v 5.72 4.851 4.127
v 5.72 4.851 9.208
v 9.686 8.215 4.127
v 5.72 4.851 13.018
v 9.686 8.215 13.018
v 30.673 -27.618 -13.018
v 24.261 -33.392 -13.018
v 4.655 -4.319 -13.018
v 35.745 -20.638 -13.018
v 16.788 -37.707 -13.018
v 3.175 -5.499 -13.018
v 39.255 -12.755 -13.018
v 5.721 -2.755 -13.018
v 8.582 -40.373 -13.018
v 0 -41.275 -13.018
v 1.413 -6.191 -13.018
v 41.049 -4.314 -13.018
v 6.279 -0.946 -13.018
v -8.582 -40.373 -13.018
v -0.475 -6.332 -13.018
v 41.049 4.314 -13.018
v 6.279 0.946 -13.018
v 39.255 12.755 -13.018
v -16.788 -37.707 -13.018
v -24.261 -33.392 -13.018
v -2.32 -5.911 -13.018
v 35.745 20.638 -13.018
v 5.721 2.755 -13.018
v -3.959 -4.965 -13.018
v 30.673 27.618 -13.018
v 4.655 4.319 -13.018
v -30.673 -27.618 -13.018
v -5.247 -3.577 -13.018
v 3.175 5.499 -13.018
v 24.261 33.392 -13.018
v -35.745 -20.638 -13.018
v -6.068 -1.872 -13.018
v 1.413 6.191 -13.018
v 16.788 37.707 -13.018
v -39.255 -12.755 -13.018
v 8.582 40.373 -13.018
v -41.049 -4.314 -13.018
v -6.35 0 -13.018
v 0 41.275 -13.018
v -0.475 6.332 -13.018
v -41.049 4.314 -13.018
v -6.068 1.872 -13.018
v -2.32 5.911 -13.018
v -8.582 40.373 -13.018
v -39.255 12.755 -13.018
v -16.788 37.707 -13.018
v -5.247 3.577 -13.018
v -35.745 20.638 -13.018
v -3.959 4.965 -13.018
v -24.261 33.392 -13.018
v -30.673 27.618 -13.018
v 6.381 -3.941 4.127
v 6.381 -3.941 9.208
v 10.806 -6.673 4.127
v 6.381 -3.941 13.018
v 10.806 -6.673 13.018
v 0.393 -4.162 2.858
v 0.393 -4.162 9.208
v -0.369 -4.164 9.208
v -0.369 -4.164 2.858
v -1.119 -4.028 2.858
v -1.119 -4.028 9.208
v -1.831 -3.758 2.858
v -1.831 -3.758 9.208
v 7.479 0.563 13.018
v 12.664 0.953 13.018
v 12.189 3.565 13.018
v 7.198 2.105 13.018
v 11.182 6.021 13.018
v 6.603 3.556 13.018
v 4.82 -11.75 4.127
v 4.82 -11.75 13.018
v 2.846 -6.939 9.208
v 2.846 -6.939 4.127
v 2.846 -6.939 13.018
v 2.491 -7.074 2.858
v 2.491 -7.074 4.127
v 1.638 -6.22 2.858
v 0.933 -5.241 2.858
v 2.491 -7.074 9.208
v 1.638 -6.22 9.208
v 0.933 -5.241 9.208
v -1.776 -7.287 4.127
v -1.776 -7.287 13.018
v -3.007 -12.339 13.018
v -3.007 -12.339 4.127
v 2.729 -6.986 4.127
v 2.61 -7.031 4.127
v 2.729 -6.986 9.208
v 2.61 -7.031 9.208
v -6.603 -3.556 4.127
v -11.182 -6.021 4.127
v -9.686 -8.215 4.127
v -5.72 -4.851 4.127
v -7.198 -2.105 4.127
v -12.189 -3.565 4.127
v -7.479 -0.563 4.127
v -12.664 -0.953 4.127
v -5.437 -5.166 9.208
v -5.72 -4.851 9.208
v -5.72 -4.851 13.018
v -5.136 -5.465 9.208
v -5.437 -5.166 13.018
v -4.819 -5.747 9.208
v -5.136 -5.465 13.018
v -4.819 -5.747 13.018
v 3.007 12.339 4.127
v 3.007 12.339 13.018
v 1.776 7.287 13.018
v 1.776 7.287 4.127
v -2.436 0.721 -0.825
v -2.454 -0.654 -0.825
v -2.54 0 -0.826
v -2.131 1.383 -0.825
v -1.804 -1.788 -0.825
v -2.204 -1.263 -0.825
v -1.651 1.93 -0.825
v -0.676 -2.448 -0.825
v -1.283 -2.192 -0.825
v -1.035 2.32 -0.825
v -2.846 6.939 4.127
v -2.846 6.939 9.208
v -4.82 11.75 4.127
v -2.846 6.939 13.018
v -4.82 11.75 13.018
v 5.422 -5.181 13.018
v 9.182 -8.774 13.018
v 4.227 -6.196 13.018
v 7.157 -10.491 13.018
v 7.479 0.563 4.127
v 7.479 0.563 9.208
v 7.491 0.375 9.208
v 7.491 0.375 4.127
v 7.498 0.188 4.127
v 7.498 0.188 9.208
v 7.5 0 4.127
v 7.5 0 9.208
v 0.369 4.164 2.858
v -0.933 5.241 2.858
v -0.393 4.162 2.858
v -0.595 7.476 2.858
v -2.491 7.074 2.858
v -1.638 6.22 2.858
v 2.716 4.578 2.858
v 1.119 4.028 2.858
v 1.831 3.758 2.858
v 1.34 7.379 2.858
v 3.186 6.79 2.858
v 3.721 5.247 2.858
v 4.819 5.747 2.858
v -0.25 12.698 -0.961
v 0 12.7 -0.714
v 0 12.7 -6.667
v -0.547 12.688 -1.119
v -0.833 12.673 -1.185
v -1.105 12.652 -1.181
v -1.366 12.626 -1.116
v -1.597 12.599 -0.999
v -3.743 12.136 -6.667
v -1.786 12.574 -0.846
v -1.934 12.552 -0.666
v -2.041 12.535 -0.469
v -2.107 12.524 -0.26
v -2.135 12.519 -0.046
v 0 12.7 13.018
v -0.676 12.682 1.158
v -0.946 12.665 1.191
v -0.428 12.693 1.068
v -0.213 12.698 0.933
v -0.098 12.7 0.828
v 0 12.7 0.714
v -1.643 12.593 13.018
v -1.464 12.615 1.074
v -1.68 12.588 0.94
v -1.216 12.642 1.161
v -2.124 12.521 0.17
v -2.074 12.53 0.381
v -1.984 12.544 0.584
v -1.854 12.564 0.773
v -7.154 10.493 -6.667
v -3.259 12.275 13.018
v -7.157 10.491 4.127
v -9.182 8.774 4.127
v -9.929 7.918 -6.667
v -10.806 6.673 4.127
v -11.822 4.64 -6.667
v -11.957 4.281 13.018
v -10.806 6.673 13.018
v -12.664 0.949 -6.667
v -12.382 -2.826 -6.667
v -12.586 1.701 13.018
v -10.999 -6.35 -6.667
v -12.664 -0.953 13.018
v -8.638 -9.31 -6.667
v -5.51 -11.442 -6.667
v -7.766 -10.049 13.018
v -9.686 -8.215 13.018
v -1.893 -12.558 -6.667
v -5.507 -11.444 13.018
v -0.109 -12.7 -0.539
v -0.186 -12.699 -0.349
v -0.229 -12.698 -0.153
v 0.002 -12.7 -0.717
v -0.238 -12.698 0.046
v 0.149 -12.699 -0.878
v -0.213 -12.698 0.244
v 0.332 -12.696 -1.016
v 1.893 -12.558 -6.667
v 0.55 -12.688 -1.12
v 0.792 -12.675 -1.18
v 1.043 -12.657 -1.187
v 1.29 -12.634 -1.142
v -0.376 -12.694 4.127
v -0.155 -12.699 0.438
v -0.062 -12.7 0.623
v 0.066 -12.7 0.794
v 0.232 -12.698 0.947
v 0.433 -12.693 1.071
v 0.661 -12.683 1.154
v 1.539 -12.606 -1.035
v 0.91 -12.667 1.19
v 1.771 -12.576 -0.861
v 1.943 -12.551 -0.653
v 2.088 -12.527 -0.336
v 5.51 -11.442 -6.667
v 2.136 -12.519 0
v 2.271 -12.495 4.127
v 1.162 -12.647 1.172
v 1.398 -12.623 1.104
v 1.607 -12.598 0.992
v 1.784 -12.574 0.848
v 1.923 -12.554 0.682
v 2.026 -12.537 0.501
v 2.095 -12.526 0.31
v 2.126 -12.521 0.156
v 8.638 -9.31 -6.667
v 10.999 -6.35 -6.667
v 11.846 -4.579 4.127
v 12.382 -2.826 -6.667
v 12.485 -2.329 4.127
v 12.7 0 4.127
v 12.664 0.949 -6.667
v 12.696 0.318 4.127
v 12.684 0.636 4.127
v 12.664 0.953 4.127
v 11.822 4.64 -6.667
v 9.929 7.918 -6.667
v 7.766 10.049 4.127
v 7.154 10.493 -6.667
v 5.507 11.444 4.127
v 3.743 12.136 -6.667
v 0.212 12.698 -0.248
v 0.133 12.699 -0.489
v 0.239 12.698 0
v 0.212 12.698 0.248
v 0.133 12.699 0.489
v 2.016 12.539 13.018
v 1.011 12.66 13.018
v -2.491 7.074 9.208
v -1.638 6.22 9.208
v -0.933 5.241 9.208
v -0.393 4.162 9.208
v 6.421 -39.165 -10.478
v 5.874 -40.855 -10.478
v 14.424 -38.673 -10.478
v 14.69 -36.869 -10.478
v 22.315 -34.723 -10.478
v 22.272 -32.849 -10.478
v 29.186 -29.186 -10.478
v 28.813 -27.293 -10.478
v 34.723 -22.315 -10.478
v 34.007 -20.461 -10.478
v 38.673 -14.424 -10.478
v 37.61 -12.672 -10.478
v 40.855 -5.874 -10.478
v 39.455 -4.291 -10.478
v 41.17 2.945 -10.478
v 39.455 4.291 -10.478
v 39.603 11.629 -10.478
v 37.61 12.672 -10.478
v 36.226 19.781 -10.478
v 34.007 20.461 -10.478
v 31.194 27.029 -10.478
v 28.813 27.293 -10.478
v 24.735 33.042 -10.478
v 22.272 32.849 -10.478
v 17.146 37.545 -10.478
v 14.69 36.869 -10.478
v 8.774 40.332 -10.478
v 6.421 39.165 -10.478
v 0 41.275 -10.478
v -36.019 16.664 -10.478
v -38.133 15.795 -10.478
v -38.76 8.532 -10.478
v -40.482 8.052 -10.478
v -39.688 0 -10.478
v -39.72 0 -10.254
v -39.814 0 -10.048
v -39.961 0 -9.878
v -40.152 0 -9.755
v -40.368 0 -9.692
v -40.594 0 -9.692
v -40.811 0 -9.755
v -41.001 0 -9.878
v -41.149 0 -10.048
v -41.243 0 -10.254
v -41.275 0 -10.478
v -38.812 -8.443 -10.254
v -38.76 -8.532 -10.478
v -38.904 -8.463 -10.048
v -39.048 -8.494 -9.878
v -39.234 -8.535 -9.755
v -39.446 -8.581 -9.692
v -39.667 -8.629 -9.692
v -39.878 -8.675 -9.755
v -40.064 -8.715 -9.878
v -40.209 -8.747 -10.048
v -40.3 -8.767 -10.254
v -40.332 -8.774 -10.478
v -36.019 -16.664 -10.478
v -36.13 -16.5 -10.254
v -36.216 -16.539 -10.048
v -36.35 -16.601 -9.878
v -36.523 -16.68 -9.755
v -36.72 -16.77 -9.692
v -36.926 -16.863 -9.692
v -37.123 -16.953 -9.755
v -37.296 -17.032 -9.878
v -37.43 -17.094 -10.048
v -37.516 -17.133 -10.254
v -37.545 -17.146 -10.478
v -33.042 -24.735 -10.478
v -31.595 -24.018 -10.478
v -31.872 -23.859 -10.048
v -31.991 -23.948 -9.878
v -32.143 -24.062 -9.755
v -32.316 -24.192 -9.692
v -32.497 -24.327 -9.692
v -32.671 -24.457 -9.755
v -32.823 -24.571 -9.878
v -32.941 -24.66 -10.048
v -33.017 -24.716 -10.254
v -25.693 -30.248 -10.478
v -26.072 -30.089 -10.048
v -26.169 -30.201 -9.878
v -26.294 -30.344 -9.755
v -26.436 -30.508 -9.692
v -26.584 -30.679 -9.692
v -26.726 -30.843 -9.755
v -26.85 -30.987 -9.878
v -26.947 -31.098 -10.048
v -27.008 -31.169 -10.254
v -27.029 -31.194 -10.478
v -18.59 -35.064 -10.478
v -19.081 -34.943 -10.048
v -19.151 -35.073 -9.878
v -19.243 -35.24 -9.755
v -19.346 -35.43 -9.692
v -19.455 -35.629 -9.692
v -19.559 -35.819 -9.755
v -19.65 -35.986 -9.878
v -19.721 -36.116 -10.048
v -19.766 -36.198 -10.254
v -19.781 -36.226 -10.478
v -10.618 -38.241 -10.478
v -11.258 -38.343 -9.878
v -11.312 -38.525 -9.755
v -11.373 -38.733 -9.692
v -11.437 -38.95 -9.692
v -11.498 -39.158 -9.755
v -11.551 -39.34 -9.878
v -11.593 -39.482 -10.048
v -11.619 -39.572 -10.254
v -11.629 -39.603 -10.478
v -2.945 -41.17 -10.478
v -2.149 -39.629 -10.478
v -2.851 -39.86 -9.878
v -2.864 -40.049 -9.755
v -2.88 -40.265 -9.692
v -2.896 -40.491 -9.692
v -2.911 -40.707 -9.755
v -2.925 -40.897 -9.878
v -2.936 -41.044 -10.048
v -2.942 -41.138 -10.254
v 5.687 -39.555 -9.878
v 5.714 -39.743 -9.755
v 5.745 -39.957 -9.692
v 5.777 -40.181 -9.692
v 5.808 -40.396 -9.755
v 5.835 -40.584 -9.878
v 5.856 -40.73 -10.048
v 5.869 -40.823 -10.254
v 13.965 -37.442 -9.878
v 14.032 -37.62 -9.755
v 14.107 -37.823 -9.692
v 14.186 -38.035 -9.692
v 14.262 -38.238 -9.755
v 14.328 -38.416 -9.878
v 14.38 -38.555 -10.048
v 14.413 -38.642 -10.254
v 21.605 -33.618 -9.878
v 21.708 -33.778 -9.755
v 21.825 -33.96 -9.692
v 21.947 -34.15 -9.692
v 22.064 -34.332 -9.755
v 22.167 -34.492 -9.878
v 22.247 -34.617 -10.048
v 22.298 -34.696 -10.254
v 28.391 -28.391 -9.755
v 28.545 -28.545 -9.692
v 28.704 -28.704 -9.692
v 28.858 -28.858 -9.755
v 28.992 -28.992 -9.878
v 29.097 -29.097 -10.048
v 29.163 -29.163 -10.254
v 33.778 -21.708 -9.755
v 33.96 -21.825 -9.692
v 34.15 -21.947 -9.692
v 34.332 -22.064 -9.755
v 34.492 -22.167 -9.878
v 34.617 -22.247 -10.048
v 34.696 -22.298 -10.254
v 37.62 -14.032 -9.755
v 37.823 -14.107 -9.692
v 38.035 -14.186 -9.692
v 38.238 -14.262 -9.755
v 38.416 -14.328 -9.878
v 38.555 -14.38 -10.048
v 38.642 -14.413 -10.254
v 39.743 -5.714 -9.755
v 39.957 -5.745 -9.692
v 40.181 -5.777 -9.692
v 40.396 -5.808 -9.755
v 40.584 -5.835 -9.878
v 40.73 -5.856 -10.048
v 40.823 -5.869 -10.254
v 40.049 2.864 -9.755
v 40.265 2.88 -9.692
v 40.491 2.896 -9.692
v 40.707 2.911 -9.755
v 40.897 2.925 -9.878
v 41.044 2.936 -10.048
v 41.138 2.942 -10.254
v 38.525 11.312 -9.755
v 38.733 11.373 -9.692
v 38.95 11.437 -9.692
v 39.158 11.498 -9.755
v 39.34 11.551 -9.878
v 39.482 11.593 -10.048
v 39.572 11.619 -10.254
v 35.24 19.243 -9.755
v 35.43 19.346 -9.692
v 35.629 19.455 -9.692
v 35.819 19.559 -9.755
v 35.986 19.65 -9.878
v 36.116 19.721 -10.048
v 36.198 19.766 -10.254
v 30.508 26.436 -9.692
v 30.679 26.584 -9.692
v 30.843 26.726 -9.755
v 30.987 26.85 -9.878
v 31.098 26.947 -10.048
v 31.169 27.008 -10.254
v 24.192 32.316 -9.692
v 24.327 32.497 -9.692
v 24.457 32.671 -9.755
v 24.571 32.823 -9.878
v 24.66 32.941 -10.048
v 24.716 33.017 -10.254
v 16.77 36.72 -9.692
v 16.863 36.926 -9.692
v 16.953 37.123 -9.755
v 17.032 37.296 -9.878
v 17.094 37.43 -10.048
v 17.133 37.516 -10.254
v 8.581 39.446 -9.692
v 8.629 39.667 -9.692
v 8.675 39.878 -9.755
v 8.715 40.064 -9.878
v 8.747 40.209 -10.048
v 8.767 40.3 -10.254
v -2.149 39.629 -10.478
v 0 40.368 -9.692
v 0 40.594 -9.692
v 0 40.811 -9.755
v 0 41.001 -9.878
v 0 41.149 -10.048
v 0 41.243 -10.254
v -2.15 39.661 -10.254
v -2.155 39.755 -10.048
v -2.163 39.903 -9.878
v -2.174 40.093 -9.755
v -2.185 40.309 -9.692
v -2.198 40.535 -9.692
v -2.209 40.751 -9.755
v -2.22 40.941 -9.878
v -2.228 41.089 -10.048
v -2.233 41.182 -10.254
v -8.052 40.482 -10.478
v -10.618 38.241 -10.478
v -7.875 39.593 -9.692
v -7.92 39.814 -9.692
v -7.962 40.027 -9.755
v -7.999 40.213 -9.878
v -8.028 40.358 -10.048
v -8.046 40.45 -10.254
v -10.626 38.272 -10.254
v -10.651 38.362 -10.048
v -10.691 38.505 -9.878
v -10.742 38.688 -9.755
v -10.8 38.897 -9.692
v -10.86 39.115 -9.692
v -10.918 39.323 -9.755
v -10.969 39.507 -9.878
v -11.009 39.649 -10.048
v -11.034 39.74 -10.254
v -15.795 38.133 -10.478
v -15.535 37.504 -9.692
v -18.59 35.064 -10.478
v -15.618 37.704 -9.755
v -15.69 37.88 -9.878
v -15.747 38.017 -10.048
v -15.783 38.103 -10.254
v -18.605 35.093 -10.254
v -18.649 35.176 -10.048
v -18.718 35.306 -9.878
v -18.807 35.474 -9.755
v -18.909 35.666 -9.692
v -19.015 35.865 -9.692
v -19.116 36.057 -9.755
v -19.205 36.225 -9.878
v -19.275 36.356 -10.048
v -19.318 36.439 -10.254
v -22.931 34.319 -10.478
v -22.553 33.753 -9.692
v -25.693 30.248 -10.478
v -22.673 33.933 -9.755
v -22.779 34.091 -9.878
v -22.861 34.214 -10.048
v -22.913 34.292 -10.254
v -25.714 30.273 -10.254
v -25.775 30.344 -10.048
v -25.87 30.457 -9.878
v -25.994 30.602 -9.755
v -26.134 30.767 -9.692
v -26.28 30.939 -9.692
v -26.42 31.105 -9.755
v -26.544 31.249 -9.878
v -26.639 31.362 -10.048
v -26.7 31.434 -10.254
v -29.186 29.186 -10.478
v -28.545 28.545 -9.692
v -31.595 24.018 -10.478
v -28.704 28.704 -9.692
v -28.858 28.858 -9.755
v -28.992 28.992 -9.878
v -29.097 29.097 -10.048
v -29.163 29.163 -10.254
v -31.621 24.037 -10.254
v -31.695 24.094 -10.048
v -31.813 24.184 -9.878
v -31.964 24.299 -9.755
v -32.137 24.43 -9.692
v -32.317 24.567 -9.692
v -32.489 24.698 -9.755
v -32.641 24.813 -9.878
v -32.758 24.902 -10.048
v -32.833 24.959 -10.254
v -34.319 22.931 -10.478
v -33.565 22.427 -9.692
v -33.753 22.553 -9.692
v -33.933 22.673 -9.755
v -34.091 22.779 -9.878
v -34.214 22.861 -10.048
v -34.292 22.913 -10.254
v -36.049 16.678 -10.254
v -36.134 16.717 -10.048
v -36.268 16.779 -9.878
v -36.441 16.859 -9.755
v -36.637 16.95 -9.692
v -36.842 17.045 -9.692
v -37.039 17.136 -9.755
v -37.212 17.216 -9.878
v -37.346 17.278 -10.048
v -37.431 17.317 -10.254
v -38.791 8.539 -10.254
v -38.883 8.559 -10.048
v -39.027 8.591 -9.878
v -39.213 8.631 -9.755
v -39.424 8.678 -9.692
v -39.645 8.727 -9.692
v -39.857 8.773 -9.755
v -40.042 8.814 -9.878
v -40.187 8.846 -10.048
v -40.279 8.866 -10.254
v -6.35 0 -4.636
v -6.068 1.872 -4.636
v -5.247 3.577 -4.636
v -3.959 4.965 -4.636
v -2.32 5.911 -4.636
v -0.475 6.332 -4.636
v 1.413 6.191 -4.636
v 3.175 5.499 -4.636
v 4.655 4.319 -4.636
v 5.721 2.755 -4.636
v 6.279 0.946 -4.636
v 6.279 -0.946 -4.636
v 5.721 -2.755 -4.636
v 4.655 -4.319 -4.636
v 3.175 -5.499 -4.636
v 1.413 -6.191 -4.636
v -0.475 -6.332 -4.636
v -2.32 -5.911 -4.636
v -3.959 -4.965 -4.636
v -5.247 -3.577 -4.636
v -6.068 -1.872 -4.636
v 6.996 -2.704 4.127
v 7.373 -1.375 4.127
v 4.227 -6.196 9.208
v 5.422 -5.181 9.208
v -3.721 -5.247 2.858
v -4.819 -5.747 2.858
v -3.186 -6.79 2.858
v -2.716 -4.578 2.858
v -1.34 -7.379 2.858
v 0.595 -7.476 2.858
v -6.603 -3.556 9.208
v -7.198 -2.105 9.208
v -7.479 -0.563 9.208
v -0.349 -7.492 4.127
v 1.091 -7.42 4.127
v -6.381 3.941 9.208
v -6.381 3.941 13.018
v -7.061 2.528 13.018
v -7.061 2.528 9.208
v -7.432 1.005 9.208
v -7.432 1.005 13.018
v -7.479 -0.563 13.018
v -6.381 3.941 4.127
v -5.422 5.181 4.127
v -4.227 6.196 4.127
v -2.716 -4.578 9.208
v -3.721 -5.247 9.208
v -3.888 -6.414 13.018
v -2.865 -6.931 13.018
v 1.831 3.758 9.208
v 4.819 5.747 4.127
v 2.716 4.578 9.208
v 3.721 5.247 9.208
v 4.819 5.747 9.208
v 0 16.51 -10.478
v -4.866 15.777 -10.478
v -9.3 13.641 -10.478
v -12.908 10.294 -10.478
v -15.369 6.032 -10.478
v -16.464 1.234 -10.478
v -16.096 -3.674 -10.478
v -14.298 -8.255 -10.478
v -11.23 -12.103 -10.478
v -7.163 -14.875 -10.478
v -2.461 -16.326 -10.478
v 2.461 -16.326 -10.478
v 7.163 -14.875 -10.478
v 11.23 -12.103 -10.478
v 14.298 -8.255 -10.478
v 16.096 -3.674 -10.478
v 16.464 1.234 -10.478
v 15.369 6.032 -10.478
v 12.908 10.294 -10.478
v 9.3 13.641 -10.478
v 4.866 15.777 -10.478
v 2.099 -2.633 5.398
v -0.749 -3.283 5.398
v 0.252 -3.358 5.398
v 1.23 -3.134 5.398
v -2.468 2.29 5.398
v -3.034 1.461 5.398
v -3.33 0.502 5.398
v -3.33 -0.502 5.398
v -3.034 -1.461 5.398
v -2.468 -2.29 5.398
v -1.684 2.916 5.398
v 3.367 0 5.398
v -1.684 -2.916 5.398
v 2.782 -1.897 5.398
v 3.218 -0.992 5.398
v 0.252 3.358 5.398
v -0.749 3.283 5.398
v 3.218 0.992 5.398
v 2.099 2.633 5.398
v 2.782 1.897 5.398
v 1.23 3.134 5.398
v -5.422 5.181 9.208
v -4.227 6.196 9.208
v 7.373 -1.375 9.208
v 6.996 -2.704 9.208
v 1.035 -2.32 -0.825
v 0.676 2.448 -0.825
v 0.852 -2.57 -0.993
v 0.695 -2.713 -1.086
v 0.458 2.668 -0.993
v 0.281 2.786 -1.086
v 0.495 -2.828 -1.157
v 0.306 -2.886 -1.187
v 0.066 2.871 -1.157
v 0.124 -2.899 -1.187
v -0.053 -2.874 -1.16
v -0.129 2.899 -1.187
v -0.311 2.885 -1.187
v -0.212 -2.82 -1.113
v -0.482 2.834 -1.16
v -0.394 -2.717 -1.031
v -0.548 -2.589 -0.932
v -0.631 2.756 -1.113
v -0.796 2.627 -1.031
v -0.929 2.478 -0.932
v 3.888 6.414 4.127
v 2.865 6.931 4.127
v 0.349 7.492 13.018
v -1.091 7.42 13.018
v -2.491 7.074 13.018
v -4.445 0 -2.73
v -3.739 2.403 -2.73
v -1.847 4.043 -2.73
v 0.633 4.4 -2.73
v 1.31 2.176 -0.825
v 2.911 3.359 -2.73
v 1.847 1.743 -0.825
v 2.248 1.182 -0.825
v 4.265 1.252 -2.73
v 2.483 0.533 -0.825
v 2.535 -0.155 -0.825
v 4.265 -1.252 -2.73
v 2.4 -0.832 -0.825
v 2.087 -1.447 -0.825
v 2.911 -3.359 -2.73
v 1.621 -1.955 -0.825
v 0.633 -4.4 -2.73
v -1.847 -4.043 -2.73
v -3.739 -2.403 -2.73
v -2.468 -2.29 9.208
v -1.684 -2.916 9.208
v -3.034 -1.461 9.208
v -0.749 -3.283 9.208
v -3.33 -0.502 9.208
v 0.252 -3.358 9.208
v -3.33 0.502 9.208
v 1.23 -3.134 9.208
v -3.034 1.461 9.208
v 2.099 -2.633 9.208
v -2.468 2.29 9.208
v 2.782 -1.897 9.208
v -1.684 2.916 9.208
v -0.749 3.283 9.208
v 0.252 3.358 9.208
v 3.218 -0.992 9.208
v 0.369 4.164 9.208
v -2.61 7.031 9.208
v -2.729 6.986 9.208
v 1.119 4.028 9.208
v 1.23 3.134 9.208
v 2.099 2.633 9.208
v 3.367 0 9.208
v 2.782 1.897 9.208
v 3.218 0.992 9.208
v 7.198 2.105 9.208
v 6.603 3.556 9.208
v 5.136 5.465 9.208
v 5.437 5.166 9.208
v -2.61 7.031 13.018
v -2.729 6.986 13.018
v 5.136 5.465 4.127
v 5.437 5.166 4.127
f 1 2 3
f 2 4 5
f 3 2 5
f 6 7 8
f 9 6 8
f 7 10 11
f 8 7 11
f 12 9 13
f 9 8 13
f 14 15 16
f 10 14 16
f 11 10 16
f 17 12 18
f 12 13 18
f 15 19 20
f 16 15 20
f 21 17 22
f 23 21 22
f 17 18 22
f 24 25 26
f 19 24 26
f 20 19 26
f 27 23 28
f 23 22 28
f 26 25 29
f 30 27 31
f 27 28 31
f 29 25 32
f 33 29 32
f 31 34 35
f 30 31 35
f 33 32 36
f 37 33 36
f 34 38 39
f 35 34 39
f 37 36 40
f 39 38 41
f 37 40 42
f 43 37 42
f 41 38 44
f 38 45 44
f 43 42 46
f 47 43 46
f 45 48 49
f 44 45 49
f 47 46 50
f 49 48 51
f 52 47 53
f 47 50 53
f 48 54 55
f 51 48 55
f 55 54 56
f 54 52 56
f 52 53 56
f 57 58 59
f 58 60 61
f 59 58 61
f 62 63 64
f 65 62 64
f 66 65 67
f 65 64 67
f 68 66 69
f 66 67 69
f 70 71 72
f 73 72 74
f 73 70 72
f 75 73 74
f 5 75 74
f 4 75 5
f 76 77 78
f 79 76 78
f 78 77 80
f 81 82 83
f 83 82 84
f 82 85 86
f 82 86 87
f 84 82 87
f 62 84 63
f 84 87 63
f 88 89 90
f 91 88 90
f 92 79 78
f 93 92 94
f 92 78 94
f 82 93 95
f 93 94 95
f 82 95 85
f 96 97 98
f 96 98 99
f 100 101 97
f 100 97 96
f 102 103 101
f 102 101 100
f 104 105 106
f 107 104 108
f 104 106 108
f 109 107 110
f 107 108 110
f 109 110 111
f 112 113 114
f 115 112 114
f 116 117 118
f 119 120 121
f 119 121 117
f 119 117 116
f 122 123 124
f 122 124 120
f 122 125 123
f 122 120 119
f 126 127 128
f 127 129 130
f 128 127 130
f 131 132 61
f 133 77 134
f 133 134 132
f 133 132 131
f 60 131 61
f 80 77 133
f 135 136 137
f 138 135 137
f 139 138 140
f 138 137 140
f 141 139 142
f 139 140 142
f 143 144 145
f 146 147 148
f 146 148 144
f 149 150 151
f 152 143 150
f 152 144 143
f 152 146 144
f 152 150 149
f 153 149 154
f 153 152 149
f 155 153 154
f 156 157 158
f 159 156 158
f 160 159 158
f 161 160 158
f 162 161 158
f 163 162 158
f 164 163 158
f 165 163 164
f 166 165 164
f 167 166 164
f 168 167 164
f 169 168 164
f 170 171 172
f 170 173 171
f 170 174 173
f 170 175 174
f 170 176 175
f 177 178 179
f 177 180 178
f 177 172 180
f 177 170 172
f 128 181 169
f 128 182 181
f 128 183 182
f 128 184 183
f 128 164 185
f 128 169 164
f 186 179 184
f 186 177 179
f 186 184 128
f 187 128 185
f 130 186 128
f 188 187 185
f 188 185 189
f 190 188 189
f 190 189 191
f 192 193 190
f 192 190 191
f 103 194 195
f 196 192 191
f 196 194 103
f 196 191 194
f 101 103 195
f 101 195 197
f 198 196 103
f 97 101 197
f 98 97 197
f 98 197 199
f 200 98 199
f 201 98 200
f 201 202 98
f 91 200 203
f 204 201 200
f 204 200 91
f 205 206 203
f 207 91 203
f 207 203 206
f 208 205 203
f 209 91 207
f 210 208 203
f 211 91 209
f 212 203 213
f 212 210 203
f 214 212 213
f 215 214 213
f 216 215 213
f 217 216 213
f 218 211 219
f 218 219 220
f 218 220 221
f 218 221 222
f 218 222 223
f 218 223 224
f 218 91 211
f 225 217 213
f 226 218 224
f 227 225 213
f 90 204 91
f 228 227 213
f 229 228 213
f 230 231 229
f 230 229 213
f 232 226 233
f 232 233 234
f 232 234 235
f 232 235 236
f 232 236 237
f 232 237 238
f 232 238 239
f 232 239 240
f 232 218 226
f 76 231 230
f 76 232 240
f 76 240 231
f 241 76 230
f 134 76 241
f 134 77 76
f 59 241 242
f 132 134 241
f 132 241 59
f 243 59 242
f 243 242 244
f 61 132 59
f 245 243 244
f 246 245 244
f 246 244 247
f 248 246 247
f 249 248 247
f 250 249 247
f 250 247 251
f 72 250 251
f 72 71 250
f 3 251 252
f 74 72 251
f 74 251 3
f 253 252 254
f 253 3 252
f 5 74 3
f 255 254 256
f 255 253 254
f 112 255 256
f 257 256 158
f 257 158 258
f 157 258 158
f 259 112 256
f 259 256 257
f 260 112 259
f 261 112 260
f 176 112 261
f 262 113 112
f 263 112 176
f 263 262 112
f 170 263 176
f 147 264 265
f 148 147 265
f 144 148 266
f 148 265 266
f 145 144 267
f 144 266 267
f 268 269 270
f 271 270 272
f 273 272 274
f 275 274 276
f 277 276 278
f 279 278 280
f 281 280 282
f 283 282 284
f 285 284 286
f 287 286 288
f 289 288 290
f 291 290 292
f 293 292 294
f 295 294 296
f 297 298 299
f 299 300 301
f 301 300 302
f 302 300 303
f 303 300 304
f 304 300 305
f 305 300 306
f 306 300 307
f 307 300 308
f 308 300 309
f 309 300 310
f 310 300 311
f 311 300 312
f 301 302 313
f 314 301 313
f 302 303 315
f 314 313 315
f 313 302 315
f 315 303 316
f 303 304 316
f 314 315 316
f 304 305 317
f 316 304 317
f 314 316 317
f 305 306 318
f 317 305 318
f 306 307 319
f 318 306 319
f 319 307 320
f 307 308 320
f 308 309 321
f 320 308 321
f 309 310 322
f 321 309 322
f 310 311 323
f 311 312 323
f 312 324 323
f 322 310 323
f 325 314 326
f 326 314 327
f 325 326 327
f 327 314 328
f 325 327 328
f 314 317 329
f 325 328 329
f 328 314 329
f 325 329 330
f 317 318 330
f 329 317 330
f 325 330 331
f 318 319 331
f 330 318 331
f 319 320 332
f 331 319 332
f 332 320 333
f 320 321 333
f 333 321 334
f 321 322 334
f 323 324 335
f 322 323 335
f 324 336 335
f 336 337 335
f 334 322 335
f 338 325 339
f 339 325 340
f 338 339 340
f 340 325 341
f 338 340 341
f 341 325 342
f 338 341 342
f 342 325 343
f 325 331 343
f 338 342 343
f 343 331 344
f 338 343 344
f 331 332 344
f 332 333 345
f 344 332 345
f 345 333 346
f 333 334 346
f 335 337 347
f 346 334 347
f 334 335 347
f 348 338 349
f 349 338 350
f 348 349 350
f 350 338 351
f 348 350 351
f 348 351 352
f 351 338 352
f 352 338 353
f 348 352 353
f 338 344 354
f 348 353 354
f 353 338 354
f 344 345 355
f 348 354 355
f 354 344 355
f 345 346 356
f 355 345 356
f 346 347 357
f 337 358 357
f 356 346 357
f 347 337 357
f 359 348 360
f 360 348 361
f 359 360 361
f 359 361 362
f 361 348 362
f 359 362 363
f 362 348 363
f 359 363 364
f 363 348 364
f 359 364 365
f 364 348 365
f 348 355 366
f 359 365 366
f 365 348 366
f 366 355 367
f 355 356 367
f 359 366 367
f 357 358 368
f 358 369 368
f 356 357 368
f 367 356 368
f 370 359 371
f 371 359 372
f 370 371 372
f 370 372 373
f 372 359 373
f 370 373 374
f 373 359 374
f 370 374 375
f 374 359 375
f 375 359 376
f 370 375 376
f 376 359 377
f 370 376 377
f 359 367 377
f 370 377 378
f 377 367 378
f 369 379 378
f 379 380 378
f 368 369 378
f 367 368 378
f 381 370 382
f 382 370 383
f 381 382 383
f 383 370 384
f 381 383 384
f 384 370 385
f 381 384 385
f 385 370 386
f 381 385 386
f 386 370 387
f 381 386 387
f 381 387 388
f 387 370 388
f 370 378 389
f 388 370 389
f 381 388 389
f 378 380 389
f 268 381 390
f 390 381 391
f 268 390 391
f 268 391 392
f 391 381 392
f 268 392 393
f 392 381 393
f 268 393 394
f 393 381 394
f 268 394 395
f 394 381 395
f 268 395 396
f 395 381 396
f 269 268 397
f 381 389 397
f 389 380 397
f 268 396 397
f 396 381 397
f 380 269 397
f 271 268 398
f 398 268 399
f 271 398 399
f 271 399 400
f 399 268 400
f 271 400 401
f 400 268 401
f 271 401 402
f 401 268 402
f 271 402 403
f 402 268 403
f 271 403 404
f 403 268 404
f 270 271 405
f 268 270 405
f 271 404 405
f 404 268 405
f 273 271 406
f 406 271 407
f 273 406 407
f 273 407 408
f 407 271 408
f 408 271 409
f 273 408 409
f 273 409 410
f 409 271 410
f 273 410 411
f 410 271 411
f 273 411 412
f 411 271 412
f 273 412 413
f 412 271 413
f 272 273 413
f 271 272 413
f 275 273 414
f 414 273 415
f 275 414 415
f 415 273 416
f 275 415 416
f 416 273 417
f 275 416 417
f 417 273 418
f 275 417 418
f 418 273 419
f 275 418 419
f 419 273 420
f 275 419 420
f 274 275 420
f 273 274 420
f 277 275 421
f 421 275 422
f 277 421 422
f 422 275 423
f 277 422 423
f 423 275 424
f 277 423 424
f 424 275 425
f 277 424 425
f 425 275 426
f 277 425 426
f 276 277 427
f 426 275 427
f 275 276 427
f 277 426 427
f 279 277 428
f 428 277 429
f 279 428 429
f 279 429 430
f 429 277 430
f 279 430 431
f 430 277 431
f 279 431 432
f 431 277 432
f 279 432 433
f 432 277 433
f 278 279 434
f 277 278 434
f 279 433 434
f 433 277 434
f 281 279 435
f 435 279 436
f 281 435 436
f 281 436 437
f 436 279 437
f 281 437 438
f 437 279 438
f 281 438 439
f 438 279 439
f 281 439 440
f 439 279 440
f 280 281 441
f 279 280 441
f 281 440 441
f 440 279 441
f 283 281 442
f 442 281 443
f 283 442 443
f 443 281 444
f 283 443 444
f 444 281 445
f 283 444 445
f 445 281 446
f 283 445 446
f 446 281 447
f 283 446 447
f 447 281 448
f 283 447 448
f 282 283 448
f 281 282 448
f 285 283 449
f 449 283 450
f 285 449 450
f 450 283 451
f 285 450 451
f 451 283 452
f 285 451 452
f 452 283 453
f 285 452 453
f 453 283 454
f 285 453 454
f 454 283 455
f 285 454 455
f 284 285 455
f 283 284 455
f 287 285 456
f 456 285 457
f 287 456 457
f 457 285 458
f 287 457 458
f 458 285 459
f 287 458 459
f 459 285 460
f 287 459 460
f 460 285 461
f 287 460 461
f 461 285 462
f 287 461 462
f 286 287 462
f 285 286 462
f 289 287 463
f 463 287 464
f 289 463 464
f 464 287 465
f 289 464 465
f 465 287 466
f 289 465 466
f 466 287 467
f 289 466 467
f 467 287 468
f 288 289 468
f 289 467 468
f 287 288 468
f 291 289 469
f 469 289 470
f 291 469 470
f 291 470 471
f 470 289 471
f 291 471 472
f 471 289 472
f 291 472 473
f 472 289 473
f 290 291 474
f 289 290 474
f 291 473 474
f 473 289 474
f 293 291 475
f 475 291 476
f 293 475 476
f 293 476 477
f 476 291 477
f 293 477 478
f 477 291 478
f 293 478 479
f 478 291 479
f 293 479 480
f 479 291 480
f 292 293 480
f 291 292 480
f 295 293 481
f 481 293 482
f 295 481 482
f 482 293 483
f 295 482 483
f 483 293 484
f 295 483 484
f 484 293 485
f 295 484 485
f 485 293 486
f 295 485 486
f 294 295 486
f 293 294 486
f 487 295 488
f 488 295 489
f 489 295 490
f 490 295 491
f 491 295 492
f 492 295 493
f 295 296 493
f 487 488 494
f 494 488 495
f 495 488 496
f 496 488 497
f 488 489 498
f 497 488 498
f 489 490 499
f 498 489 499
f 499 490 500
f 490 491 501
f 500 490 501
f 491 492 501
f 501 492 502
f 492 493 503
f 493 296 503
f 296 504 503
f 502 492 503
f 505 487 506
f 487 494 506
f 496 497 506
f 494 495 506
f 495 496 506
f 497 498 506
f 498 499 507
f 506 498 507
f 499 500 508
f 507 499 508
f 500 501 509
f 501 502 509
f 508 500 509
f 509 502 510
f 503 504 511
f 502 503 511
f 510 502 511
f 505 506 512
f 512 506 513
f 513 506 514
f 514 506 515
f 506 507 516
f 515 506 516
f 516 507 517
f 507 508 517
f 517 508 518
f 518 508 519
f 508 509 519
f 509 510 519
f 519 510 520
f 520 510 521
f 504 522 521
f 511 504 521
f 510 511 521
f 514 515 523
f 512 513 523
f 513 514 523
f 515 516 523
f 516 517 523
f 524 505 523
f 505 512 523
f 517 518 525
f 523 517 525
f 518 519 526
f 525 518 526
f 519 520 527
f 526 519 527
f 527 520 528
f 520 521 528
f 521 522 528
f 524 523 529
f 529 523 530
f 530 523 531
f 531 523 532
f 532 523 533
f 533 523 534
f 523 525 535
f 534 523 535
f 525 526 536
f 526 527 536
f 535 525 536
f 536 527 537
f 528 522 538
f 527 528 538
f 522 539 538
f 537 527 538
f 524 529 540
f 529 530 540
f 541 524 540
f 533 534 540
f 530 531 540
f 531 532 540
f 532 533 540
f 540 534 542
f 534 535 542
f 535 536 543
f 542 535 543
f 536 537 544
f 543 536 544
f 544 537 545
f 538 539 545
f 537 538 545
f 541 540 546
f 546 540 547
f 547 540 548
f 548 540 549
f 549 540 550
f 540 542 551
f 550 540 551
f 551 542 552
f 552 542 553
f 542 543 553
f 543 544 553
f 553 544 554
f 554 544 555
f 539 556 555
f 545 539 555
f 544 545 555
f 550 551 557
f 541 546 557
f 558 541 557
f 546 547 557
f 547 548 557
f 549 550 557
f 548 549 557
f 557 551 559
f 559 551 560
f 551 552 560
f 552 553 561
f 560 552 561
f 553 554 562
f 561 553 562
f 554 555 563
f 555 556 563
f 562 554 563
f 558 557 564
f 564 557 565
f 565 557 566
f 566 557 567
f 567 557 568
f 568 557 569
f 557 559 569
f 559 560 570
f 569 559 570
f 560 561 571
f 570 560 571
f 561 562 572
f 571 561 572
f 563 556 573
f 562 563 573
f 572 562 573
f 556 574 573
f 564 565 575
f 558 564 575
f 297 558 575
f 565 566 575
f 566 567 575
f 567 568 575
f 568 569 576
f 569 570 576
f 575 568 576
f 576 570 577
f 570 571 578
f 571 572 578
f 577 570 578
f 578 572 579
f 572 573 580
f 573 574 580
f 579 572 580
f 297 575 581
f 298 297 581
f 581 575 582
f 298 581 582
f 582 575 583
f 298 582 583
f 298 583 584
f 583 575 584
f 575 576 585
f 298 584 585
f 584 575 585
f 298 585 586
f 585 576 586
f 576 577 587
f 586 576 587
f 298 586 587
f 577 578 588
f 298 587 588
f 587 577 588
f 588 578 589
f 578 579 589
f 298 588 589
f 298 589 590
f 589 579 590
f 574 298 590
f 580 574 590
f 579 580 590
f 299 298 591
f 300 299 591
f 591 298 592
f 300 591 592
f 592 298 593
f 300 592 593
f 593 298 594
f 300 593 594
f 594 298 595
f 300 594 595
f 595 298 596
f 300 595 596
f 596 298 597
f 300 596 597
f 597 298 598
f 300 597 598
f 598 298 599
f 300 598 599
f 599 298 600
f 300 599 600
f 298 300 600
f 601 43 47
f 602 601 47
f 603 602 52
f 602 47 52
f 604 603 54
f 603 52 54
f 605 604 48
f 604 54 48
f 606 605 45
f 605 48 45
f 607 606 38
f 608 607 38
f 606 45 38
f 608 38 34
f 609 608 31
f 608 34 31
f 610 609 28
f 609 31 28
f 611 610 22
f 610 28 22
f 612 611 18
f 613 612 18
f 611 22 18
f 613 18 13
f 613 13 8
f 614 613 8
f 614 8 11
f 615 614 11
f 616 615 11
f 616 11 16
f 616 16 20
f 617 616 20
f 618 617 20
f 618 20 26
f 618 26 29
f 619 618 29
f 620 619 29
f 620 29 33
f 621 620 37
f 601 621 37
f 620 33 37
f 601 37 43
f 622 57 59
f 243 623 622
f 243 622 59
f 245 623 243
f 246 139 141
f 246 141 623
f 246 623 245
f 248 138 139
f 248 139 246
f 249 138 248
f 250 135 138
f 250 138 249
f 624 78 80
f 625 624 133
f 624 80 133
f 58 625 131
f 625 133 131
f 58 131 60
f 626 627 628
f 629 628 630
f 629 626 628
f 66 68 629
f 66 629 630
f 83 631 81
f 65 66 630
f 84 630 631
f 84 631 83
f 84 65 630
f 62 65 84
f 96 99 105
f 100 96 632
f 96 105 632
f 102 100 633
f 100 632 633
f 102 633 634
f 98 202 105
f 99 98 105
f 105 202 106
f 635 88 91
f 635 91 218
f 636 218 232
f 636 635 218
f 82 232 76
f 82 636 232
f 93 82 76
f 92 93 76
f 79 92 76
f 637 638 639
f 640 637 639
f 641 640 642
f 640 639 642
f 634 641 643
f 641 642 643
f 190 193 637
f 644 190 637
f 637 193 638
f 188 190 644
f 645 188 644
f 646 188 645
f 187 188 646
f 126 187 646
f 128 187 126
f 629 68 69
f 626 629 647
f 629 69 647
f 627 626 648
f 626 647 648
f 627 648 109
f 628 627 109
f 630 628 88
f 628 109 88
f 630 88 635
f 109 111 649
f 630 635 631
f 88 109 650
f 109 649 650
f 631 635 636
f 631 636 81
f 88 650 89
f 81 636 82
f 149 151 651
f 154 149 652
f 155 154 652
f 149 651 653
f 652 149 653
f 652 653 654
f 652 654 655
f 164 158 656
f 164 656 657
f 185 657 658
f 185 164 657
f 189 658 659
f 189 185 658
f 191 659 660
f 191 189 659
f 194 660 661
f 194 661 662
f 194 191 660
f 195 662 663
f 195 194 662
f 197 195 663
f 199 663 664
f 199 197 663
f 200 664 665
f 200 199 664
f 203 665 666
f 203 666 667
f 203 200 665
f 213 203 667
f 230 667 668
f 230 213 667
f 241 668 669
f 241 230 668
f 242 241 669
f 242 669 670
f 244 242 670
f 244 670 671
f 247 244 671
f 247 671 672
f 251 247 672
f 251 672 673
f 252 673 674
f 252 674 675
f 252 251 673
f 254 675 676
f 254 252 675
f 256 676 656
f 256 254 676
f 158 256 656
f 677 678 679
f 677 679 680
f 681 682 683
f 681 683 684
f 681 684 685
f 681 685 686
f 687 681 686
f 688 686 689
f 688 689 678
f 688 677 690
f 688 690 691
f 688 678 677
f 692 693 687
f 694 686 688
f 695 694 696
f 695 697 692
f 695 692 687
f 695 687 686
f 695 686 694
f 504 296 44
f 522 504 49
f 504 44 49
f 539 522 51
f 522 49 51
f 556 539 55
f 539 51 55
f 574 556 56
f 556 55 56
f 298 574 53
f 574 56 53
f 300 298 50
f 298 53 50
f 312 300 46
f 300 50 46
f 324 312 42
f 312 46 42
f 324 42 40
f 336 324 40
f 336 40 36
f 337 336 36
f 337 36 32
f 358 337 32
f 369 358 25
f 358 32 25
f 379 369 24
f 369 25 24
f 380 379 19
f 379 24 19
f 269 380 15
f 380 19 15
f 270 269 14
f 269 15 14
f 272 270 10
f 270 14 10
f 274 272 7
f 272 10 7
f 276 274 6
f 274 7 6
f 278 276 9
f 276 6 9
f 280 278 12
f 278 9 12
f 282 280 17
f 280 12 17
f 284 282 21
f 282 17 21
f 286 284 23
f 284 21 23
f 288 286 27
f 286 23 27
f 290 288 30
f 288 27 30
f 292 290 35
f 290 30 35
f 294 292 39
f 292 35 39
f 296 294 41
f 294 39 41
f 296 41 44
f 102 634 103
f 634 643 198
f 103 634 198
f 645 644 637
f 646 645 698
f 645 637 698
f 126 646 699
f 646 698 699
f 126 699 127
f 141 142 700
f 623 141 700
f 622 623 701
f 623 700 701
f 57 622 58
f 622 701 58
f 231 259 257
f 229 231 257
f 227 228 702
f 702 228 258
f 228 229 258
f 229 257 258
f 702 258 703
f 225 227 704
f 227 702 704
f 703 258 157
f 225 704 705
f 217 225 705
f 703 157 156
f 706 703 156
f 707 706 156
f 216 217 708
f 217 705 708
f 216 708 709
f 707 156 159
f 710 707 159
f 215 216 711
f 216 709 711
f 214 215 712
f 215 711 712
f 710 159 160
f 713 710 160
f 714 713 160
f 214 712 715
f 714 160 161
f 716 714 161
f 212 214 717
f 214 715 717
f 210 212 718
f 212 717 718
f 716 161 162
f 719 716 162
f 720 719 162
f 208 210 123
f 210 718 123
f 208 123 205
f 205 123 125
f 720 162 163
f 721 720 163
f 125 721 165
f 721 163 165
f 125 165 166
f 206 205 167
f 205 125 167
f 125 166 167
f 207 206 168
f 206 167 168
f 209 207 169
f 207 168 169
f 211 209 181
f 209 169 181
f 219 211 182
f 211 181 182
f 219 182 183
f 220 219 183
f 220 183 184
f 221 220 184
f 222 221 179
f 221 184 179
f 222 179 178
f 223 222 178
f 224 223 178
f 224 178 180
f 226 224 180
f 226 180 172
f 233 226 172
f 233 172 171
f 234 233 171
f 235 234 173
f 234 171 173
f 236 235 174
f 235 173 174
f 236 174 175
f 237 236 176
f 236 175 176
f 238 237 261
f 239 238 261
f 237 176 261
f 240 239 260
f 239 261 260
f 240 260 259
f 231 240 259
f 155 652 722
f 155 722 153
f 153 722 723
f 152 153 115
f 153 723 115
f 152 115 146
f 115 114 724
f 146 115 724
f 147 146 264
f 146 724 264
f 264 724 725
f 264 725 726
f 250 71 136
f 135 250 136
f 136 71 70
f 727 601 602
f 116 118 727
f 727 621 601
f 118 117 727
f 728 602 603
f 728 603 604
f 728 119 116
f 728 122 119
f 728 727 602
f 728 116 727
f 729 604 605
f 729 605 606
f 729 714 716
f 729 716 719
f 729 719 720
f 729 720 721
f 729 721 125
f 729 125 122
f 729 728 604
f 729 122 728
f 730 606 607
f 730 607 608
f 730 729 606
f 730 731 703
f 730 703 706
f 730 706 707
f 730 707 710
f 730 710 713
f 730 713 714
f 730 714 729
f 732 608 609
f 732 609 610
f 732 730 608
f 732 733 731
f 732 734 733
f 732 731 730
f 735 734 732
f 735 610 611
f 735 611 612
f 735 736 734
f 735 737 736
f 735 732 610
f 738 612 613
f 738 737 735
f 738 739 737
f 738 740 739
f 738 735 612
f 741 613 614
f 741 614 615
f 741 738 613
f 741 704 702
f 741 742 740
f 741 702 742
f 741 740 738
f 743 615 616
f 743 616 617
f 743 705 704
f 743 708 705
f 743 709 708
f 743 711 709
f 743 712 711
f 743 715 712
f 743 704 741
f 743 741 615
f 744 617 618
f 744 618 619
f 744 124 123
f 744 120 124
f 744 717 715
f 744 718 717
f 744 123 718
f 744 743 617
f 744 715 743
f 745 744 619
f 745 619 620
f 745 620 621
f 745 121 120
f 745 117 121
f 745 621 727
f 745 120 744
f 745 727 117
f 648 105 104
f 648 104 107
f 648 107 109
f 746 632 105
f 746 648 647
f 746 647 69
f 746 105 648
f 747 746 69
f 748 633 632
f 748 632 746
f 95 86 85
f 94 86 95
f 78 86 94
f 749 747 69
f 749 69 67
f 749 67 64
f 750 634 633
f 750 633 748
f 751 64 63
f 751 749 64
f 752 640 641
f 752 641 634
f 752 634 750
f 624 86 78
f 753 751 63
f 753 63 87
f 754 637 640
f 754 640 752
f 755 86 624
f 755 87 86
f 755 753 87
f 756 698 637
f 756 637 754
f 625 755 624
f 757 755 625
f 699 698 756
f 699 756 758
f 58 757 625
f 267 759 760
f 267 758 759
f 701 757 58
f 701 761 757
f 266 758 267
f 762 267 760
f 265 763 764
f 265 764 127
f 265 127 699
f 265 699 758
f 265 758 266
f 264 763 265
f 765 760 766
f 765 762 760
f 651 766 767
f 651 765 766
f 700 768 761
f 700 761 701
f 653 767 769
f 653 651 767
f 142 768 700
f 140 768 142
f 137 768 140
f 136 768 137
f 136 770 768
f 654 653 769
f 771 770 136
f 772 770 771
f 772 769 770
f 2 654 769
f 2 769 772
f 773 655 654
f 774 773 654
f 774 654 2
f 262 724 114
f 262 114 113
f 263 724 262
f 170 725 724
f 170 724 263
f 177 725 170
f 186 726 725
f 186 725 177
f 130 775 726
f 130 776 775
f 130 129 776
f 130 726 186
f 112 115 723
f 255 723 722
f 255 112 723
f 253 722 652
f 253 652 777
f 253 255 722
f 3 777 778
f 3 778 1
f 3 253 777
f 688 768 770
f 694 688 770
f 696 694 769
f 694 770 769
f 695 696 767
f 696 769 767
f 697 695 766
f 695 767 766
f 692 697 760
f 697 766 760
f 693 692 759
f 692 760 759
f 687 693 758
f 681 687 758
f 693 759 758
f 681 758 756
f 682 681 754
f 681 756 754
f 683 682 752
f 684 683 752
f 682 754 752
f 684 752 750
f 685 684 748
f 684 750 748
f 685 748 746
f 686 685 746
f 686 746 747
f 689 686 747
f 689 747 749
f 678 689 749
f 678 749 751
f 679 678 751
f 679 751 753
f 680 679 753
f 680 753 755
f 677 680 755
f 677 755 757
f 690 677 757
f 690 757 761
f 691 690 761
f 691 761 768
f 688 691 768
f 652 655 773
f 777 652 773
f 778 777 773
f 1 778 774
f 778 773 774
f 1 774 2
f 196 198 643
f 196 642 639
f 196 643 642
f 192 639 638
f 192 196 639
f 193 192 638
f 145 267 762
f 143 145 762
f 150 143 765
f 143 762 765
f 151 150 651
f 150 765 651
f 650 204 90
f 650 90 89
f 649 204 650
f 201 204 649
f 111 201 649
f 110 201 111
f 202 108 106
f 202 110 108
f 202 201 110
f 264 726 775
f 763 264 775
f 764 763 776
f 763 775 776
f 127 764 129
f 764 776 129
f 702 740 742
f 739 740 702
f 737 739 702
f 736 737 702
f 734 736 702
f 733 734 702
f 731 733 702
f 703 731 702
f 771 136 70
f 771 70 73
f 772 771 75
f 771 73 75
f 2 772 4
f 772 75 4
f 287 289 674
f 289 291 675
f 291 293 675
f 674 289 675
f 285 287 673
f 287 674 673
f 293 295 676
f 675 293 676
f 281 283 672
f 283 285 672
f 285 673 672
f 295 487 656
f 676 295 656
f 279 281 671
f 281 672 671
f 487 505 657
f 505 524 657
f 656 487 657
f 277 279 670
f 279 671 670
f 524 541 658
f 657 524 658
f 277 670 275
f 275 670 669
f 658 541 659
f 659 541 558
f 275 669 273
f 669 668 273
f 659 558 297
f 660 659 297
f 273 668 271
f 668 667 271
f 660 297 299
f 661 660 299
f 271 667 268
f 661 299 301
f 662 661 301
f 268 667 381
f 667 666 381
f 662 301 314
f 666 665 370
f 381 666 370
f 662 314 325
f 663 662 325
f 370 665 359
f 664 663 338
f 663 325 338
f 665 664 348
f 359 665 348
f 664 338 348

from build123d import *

# Parameters (mm, degrees)
SKETCH11_R                      = 3.3672
CUT_EXTRUDE5_DEPTH              = 3.81
SKETCH11_5_R                    = 3.3672
CUT_EXTRUDE7_DEPTH              = 7.62
CUT_EXTRUDE8_DEPTH              = 10.16
SKETCH13_R                      = 6.35
CUT_EXTRUDE10_DEPTH             = 12.192
CHAMFER1_SIZE                   = 3.81
CHAMFER2_SIZE                   = 3.81
CUT_EXTRUDE11_DEPTH             = 8.89
F_3_32_0_09375_DIAMETER_HOLE1_D = 2.38125


with BuildPart() as part:
    # Sketch2 → Revolve1 (revolve)
    with BuildSketch(Plane(origin=(0, 0, 0), x_dir=(0, 0, -1), z_dir=(1, 0, 0))):
        Polygon((-13.0175, 0), (-13.0175, 9.525), (-13.0175, 12.7), (-9.8425, 12.7), (10.4775, 12.7), (10.4775, 41.275), (13.0175, 41.275), (13.0175, 0), align=None)
    revolve(axis=Axis((0, 0, -13.0175), (0, 0, 1)))

    # Sketch11 → Cut-Extrude5 (cut)
    with BuildSketch(Plane.XY.offset(13.0175)):
        with BuildLine():
            ThreePointArc((-4.819494332, -5.746518457), (-1.340267005, -7.379273972), (2.490906416, -7.074276304))
            ThreePointArc((2.490906416, -7.074276304), (1.265901972, -5.744591723), (0.392647765, -4.16151748))
            ThreePointArc((0.392647765, -4.16151748), (-0.746975478, -4.11271536), (-1.830973459, -3.757650355))
            ThreePointArc((-1.830973459, -3.757650355), (-3.205144168, -4.932534109), (-4.819494332, -5.746518457))
        make_face()
        with BuildLine():
            ThreePointArc((7.5, 0), (6.796918695, 3.17047256), (4.819494332, 5.746518457))
            ThreePointArc((4.819494332, 5.746518457), (3.205144168, 4.932534109), (1.830973459, 3.757650355))
            ThreePointArc((1.830973459, 3.757650355), (0.746975478, 4.11271536), (-0.392647765, 4.16151748))
            ThreePointArc((-0.392647765, 4.16151748), (-1.265901972, 5.744591723), (-2.490906416, 7.074276304))
            ThreePointArc((-2.490906416, 7.074276304), (-7.379273972, 1.340267005), (-4.819494332, -5.746518457))
            ThreePointArc((-4.819494332, -5.746518457), (-3.205144168, -4.932534109), (-1.830973459, -3.757650355))
            ThreePointArc((-1.830973459, -3.757650355), (-0.746975478, -4.11271536), (0.392647765, -4.16151748))
            ThreePointArc((0.392647765, -4.16151748), (1.265901972, -5.744591723), (2.490906416, -7.074276304))
            ThreePointArc((2.490906416, -7.074276304), (6.120939394, -4.334062868), (7.5, 0))
        make_face()
        Circle(SKETCH11_R, mode=Mode.SUBTRACT)
        Circle(SKETCH11_R)
        with BuildLine():
            ThreePointArc((1.830973459, 3.757650355), (3.205144168, 4.932534109), (4.819494332, 5.746518457))
            ThreePointArc((4.819494332, 5.746518457), (1.340267005, 7.379273972), (-2.490906416, 7.074276304))
            ThreePointArc((-2.490906416, 7.074276304), (-1.265901972, 5.744591723), (-0.392647765, 4.16151748))
            ThreePointArc((-0.392647765, 4.16151748), (0.746975478, 4.11271536), (1.830973459, 3.757650355))
        make_face()
    extrude(amount=-CUT_EXTRUDE5_DEPTH, mode=Mode.SUBTRACT)

    # Sketch11<5> → Cut-Extrude7 (cut)
    with BuildSketch(Plane.XY.offset(13.0175)):
        Circle(SKETCH11_5_R)
    extrude(amount=-CUT_EXTRUDE7_DEPTH, mode=Mode.SUBTRACT)

    # Sketch11<6> → Cut-Extrude8 (cut)
    with BuildSketch(Plane.XY.offset(13.0175)):
        with BuildLine():
            ThreePointArc((-4.819494332, -5.746518457), (-1.340267005, -7.379273972), (2.490906416, -7.074276304))
            ThreePointArc((2.490906416, -7.074276304), (1.265901972, -5.744591723), (0.392647765, -4.16151748))
            ThreePointArc((0.392647765, -4.16151748), (-0.746975478, -4.11271536), (-1.830973459, -3.757650355))
            ThreePointArc((-1.830973459, -3.757650355), (-3.205144168, -4.932534109), (-4.819494332, -5.746518457))
        make_face()
        with BuildLine():
            ThreePointArc((1.830973459, 3.757650355), (3.205144168, 4.932534109), (4.819494332, 5.746518457))
            ThreePointArc((4.819494332, 5.746518457), (1.340267005, 7.379273972), (-2.490906416, 7.074276304))
            ThreePointArc((-2.490906416, 7.074276304), (-1.265901972, 5.744591723), (-0.392647765, 4.16151748))
            ThreePointArc((-0.392647765, 4.16151748), (0.746975478, 4.11271536), (1.830973459, 3.757650355))
        make_face()
    extrude(amount=-CUT_EXTRUDE8_DEPTH, mode=Mode.SUBTRACT)

    # Sketch13 → Cut-Extrude10 (cut)
    with BuildSketch(Plane(origin=(0, 0, -13.0175), x_dir=(-1, 0, 0), z_dir=(0, 0, -1))):
        Circle(SKETCH13_R)
    extrude(amount=-CUT_EXTRUDE10_DEPTH, mode=Mode.SUBTRACT)

    # Chamfer1
    chamfer1_edges = [part.edges().sort_by_distance(p)[0] for p in [
        (6.35, 0, -0.8255),
    ]]
    chamfer(chamfer1_edges, length=CHAMFER1_SIZE)

    # Chamfer2
    chamfer2_edges = [part.edges().sort_by_distance(p)[0] for p in [
        (0, -12.7, -10.4775),
    ]]
    chamfer(chamfer2_edges, length=CHAMFER2_SIZE)

    # Sketch14 → Cut-Extrude11 (cut)
    with BuildSketch(Plane.XY.offset(13.0175)):
        with BuildLine():
            Line((-7.478864421, -0.562660625), (-12.664210419, -0.952771992))
            ThreePointArc((-12.664210419, -0.952771992), (-11.749957105, -4.819596251), (-9.685536123, -8.214644849))
            Line((-9.685536123, -8.214644849), (-5.719804797, -4.851168218))
            ThreePointArc((-5.719804797, -4.851168218), (-6.938951046, -2.846218259), (-7.478864421, -0.562660625))
        make_face()
        with BuildLine():
            ThreePointArc((-4.819596251, 11.749957105), (-8.214644849, 9.685536123), (-10.805586775, 6.673027383))
            Line((-10.805586775, 6.673027383), (-6.381252032, 3.940764202))
            ThreePointArc((-6.381252032, 3.940764202), (-4.851168218, 5.719804797), (-2.846218259, 6.938951046))
            Line((-2.846218259, 6.938951046), (-4.819596251, 11.749957105))
        make_face()
        with BuildLine():
            ThreePointArc((9.685536123, 8.214644849), (6.673027383, 10.805586775), (3.007316228, 12.33880258))
            Line((3.007316228, 12.33880258), (1.775974151, 7.286694437))
            ThreePointArc((1.775974151, 7.286694437), (3.940764202, 6.381252032), (5.719804797, 4.851168218))
            Line((5.719804797, 4.851168218), (9.685536123, 8.214644849))
        make_face()
        with BuildLine():
            Line((6.381252032, -3.940764202), (10.805586775, -6.673027383))
            ThreePointArc((10.805586775, -6.673027383), (12.21722047, -3.468360417), (12.7, 0))
            ThreePointArc((12.7, 0), (12.691049451, 0.476721974), (12.664210419, 0.952771992))
            Line((12.664210419, 0.952771992), (7.478864421, 0.562660625))
            ThreePointArc((7.478864421, 0.562660625), (7.494714243, 0.281528725), (7.5, 0))
            ThreePointArc((7.5, 0), (7.214893979, -2.048244341), (6.381252032, -3.940764202))
        make_face()
        with BuildLine():
            Line((-1.775974151, -7.286694437), (-3.007316228, -12.33880258))
            ThreePointArc((-3.007316228, -12.33880258), (0.952771992, -12.664210419), (4.819596251, -11.749957105))
            Line((4.819596251, -11.749957105), (2.846218259, -6.938951046))
            ThreePointArc((2.846218259, -6.938951046), (0.562660625, -7.478864421), (-1.775974151, -7.286694437))
        make_face()
    extrude(amount=-CUT_EXTRUDE11_DEPTH, mode=Mode.SUBTRACT)

    # 3/32 (0.09375) Diameter Hole1 (through all)
    with Locations(Plane(origin=(1.382526007, -18.376485052, 0), x_dir=(-0.997181923, -0.075021417, 0), z_dir=(0.075021417, -0.997181923, 0))):
        with Locations((0, 0)):
            Hole(F_3_32_0_09375_DIAMETER_HOLE1_D / 2)

    # Sketch17 → Revolve2 (revolve)
    with BuildSketch(Plane(origin=(0, 0, 0), x_dir=(1, 0, 0), z_dir=(0, 1, 0))):
        with BuildLine():
            Line((-41.275, 10.4775), (-39.6875, 10.4775))
            ThreePointArc((-39.6875, 10.4775), (-40.48125, 9.68375), (-41.275, 10.4775))
        make_face()
    revolve(axis=Axis((0, 0, -15.01775), (0, 0, 1)))


solid = part.part
